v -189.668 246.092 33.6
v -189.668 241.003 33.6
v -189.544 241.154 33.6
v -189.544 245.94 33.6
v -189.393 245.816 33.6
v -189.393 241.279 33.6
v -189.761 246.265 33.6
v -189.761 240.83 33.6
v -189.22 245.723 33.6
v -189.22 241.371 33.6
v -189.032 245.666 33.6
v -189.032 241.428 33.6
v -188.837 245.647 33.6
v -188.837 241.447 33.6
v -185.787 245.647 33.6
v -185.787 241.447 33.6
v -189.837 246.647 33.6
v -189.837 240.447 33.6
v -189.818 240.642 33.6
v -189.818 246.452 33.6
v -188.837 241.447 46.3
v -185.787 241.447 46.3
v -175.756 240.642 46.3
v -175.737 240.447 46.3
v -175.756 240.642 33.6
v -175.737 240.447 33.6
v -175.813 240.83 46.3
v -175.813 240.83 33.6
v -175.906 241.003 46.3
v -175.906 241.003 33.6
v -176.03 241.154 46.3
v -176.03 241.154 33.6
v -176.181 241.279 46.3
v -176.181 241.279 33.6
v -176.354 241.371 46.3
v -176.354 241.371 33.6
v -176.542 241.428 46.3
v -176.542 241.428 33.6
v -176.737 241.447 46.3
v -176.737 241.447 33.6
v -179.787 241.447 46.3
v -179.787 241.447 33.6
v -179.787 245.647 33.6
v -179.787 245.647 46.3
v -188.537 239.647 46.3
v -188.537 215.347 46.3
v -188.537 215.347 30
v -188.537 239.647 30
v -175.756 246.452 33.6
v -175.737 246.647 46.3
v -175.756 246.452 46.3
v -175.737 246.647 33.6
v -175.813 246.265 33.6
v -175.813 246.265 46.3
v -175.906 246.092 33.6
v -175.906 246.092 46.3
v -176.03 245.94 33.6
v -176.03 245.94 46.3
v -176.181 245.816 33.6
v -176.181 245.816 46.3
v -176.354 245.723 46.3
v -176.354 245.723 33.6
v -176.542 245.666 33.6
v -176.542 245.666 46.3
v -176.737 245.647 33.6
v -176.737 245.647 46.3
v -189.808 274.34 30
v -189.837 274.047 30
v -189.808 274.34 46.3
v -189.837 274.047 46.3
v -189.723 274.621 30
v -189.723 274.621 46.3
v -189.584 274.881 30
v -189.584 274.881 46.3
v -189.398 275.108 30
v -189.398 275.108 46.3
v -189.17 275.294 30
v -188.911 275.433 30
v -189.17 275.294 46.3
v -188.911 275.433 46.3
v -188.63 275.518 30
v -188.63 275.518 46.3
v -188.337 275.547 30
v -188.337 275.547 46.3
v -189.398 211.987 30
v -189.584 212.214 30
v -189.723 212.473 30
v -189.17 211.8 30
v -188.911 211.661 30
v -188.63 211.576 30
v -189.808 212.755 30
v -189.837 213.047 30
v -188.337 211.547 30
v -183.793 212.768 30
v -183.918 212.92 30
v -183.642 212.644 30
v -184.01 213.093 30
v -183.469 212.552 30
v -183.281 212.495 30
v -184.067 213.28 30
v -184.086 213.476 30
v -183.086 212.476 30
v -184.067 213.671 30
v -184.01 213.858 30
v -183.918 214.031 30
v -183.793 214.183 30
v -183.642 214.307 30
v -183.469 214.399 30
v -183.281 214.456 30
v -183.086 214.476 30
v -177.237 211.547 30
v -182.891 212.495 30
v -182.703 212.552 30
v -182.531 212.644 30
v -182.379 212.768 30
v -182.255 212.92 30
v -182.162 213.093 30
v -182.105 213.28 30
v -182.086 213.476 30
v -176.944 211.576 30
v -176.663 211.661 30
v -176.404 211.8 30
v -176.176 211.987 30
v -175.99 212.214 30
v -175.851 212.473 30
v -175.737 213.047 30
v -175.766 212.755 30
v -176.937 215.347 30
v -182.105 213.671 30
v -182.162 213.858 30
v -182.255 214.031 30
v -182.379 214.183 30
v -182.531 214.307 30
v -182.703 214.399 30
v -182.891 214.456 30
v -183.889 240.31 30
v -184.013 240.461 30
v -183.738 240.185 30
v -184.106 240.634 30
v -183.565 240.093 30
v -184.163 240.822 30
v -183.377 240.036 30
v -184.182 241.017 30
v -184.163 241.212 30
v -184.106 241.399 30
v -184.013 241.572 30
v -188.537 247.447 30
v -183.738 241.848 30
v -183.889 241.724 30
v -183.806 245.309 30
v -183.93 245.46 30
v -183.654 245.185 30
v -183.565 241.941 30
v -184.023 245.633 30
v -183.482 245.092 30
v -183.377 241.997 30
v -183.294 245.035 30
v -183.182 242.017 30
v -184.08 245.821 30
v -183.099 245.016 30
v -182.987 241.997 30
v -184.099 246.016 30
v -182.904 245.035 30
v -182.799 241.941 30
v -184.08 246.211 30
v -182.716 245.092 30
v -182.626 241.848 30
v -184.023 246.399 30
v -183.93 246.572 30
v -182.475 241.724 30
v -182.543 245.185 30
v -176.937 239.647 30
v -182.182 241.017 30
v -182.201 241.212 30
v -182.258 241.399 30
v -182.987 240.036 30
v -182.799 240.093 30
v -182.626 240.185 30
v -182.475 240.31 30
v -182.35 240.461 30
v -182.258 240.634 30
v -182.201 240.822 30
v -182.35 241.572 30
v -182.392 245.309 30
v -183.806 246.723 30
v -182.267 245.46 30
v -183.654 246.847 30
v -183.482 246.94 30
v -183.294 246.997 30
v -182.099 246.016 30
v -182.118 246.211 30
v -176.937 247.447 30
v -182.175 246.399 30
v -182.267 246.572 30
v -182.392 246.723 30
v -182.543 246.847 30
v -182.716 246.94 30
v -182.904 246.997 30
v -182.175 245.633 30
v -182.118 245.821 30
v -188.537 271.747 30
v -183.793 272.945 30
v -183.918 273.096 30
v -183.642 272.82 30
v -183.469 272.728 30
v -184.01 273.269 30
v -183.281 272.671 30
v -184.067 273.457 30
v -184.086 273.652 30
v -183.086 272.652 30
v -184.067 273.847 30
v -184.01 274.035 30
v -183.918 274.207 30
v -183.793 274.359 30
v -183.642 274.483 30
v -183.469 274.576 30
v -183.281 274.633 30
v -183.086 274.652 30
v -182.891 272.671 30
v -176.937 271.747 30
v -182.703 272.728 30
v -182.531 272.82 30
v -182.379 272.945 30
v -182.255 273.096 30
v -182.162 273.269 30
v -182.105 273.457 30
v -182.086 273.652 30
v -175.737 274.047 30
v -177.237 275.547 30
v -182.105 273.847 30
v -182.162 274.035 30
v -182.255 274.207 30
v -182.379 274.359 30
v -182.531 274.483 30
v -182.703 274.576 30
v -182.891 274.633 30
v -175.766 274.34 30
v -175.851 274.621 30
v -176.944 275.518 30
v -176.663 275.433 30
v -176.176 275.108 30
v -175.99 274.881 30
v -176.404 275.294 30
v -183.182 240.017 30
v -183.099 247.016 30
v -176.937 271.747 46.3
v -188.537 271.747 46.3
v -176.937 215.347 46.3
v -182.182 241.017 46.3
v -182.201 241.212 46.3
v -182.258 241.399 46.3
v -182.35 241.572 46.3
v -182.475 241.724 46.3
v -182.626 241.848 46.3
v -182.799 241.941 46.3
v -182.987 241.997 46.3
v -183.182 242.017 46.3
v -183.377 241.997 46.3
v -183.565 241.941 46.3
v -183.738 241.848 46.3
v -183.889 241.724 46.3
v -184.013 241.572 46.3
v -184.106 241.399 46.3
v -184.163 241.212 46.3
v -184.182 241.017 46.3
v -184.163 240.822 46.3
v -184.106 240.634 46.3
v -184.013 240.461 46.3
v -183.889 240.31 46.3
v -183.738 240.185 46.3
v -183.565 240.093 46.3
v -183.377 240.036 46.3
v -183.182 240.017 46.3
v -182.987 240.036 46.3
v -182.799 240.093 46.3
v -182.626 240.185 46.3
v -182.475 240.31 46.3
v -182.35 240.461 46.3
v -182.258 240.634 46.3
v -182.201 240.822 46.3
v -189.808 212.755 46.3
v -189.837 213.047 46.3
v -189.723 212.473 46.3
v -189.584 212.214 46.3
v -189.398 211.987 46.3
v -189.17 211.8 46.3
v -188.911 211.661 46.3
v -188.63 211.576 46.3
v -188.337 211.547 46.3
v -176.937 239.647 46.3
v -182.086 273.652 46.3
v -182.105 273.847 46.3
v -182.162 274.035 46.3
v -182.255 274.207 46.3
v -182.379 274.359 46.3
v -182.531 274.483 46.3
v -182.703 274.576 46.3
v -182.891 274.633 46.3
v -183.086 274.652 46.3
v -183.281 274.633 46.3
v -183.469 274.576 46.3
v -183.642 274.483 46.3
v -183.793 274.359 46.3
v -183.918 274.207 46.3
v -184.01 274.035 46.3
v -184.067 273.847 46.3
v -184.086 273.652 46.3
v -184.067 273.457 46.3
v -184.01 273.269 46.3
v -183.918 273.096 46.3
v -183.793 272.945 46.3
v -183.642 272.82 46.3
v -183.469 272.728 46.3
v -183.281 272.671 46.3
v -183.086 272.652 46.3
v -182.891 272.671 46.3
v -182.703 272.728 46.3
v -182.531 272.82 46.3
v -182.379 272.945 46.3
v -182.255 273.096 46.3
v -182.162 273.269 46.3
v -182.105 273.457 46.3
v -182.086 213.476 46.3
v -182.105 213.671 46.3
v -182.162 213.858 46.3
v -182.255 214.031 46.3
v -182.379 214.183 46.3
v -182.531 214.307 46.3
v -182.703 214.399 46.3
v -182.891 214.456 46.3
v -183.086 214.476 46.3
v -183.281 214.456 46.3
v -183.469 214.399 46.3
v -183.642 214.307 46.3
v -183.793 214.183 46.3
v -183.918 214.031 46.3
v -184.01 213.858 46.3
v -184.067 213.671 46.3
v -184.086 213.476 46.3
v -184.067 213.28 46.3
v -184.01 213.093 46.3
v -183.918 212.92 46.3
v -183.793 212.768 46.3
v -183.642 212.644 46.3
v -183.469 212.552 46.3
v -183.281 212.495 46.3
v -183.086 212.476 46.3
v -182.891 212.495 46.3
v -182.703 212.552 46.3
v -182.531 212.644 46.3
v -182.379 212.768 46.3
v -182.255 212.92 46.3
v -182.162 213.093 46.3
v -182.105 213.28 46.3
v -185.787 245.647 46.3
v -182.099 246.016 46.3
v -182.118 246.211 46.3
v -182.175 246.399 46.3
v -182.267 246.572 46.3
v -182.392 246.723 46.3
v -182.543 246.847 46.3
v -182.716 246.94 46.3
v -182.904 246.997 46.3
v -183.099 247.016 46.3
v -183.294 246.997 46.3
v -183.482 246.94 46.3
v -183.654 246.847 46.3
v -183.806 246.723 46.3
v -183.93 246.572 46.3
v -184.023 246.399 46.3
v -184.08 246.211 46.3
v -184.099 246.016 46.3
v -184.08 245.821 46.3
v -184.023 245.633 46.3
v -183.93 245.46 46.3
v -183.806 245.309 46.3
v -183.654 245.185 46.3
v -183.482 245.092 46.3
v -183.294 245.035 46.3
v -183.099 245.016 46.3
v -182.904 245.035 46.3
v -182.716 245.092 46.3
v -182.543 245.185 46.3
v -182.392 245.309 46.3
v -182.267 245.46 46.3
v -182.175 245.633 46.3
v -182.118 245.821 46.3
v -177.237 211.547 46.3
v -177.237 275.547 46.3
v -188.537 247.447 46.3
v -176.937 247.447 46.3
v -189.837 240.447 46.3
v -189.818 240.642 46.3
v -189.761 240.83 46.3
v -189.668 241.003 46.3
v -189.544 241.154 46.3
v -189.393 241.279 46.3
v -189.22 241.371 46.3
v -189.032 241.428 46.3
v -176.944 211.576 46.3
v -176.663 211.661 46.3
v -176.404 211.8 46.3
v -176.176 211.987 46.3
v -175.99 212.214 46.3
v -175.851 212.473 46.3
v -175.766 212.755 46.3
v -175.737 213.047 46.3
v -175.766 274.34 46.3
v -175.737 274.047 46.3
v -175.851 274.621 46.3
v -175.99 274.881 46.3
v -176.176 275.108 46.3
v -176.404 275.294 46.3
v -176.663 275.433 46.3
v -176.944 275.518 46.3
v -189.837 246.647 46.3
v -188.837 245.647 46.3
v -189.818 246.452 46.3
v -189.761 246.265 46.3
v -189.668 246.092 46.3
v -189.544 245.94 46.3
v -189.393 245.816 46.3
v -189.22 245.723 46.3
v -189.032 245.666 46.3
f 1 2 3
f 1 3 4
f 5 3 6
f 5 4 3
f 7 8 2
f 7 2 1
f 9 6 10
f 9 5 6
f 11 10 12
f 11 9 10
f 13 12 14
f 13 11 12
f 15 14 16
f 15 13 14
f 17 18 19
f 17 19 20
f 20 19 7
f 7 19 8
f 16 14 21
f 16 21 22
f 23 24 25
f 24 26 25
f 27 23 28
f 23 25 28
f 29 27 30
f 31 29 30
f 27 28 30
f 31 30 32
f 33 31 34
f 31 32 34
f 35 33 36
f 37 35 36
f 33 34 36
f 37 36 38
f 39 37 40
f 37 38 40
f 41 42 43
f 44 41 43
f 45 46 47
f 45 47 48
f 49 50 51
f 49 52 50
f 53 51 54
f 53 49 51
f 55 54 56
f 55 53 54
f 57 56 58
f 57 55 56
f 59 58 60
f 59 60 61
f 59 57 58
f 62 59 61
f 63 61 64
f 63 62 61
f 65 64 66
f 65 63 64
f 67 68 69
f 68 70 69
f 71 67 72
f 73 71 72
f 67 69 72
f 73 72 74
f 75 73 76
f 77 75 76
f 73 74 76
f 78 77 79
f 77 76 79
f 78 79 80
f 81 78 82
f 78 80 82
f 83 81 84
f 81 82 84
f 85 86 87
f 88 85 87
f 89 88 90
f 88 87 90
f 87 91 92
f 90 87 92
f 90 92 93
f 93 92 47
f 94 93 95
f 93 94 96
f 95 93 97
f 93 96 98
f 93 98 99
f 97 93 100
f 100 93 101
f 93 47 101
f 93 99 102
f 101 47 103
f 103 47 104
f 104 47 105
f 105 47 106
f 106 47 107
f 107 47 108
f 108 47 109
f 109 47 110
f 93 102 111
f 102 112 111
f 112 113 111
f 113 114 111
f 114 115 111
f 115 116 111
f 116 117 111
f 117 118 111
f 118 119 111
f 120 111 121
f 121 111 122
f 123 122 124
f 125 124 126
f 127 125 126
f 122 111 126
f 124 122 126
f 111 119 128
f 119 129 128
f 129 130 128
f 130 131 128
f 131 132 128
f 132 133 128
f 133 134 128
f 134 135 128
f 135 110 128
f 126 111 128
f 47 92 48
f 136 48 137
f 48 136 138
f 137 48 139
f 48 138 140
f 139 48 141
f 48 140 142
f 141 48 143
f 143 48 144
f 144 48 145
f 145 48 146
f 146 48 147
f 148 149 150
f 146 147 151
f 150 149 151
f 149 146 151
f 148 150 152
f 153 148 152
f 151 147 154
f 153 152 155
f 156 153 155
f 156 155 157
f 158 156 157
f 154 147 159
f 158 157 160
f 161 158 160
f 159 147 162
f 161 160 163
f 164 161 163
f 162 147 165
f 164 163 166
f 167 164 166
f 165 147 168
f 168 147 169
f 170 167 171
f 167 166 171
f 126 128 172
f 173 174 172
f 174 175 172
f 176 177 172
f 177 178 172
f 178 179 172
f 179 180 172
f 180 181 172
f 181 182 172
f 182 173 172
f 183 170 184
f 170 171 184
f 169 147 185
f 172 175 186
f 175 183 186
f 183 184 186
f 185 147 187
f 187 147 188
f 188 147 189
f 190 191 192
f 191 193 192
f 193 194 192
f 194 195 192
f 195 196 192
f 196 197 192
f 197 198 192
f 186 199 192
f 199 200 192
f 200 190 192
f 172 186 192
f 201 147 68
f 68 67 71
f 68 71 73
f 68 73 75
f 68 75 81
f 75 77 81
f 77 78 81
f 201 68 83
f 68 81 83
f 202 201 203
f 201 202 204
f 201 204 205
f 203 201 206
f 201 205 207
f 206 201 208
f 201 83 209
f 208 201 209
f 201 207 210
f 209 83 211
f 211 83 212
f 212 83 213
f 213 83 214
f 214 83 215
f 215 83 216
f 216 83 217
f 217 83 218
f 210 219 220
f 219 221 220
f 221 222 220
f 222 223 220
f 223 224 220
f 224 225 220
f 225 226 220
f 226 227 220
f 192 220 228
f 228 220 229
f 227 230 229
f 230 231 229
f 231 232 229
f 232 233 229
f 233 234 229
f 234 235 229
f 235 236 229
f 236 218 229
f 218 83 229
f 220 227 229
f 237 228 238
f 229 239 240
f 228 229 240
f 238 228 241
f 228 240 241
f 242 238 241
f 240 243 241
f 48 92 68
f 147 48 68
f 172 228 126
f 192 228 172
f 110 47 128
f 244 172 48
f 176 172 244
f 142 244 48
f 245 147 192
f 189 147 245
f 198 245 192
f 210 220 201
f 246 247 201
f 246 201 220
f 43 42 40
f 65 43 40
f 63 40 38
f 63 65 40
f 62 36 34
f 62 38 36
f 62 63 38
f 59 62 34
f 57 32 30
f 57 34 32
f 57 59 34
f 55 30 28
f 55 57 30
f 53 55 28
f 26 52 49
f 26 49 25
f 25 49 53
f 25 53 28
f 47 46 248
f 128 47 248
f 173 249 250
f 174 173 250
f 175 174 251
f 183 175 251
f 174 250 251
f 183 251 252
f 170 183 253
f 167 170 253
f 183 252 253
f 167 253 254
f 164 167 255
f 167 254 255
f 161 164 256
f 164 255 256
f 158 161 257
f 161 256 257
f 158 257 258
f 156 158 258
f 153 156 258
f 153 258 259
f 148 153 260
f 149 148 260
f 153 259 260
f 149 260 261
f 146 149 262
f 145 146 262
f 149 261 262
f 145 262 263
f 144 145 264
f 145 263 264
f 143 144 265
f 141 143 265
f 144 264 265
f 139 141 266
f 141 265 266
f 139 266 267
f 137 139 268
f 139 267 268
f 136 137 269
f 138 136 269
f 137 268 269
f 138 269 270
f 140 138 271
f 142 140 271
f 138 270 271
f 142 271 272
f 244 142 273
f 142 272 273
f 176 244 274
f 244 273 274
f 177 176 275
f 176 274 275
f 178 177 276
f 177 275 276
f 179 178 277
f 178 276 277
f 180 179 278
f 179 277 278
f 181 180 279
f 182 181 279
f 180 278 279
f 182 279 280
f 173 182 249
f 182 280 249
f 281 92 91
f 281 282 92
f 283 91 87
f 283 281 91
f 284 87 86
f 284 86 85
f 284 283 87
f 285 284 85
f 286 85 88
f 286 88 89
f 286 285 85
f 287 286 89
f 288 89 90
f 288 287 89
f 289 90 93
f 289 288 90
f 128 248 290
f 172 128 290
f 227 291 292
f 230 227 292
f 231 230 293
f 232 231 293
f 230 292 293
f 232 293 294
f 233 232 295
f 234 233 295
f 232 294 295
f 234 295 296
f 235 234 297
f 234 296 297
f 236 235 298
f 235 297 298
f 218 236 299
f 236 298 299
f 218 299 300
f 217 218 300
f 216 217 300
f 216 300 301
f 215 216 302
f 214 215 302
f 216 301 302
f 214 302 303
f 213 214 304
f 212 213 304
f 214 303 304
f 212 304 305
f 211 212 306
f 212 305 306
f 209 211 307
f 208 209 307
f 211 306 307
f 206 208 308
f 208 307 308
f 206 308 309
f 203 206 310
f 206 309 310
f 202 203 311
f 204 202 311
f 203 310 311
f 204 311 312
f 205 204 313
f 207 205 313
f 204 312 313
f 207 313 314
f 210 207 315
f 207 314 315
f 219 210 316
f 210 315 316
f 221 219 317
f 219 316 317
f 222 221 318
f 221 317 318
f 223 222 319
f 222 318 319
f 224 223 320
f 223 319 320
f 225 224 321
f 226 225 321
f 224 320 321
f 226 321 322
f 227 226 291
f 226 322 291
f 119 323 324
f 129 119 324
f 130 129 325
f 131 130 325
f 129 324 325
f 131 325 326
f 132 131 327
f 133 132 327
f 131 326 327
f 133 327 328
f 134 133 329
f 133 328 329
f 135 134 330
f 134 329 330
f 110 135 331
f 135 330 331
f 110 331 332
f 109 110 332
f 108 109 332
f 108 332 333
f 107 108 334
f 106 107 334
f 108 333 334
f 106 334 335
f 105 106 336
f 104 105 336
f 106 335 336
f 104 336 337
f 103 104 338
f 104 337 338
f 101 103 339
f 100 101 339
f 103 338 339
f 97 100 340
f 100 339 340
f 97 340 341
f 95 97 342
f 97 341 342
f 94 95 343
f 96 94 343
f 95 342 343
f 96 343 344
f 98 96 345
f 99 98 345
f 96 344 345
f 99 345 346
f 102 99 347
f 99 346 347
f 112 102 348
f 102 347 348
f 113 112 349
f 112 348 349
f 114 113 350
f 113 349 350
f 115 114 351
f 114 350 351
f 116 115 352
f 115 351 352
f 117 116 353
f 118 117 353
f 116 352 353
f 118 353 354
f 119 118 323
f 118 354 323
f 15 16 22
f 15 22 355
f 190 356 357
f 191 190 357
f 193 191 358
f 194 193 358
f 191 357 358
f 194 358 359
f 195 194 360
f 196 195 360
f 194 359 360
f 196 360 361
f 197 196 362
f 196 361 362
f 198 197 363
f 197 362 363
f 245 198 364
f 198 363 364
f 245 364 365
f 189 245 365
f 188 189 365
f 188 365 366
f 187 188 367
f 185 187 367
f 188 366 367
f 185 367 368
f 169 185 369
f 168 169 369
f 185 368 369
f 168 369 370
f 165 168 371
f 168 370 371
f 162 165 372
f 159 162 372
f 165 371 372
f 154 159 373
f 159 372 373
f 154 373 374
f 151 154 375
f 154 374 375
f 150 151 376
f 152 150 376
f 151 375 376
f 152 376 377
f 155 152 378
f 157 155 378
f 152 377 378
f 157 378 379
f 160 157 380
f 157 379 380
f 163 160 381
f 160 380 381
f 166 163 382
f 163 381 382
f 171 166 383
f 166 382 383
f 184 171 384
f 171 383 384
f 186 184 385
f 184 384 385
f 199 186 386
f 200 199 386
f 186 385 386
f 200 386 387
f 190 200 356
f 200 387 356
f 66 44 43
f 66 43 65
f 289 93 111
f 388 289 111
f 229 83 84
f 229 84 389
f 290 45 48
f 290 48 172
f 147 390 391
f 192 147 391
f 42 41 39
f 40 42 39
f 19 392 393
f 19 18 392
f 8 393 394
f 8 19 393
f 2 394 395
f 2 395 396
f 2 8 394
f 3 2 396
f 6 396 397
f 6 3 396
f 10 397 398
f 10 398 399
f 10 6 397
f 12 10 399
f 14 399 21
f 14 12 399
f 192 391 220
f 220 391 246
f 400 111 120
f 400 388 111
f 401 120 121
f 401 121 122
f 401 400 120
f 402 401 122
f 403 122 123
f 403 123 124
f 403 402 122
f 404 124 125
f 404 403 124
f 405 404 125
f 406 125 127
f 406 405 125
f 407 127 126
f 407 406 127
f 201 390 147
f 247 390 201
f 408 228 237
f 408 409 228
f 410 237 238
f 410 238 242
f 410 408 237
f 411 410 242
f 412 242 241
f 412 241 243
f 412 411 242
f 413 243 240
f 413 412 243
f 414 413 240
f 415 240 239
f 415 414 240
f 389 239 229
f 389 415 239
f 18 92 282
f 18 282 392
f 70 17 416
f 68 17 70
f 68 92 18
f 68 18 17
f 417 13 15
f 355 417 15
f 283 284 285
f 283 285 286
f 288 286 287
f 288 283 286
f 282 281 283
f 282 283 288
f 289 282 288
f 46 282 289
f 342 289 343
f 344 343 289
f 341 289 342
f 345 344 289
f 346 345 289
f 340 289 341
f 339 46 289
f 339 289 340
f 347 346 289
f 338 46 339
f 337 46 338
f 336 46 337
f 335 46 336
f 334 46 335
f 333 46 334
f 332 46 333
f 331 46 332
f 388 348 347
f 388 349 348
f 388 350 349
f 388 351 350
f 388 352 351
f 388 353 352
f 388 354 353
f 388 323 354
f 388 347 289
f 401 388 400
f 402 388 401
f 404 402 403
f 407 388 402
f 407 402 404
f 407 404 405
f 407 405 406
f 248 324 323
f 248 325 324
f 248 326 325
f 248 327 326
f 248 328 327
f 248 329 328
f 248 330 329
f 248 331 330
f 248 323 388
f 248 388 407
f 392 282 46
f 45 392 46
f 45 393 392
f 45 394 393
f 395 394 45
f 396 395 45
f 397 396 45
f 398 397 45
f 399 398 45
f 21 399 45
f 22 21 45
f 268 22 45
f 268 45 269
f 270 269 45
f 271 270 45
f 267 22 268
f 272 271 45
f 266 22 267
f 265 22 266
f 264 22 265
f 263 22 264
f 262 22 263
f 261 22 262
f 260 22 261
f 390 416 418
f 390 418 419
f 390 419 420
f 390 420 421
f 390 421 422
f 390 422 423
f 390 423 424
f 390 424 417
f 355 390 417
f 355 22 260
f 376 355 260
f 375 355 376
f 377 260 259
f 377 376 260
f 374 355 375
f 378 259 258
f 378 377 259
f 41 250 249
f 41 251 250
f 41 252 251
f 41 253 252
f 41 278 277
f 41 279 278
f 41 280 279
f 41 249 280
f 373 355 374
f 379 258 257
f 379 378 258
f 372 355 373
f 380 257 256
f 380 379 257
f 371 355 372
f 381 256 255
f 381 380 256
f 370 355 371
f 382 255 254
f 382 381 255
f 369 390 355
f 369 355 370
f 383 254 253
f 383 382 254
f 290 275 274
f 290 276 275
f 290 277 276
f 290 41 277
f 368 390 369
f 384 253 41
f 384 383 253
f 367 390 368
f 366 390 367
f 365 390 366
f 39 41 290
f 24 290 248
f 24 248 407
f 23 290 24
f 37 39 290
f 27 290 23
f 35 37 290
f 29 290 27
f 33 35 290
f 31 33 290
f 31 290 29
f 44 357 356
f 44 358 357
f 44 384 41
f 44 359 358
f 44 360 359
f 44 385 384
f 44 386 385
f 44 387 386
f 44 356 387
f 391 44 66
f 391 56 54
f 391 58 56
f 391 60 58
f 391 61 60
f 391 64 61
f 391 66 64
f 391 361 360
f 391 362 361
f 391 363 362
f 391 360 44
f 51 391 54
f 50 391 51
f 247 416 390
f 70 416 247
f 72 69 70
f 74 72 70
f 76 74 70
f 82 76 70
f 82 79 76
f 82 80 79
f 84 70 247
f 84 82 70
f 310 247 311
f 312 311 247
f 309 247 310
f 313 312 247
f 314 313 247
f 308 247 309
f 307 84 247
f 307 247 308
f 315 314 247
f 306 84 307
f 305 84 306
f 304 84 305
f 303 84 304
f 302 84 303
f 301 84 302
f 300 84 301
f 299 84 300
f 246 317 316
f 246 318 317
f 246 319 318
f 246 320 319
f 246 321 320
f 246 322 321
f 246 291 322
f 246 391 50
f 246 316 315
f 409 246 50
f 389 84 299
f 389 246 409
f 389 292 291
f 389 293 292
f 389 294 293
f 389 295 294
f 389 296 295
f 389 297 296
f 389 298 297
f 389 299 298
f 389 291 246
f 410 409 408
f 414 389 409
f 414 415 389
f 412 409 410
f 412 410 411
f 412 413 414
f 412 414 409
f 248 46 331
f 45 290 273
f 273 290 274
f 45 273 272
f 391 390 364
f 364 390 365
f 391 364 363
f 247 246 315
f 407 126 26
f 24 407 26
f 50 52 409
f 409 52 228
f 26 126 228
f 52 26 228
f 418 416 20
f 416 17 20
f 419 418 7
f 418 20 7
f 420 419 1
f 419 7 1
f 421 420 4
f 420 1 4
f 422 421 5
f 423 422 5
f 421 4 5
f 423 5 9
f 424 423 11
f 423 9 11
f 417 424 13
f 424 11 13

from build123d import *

# Parameters (mm, degrees)
SKETCH4_W           = 14.1
SKETCH4_H           = 64
BOSS_EXTRUDE1_DEPTH = 16.3
FILLET1_R           = 1.5
SKETCH5_W           = 11.6
SKETCH5_H           = 24.3
CUT_EXTRUDE1_DEPTH  = 16.3
SKETCH6_W           = 4.05
SKETCH6_H           = 4.2
CUT_EXTRUDE2_DEPTH  = 12.7
FILLET2_R           = 1
SKETCH7_R           = 1
CUT_EXTRUDE3_DEPTH  = 16.3


with BuildPart() as part:
    # Sketch4 → Boss-Extrude1 (new body)
    with BuildSketch(Plane.XY.offset(30)):
        with Locations((-182.786990356, 243.547210693)):
            Rectangle(SKETCH4_W, SKETCH4_H)
    extrude(amount=BOSS_EXTRUDE1_DEPTH)

    # Fillet1
    fillet1_edges = [part.edges().sort_by_distance(p)[0] for p in [
        (-189.836990356, 275.547210693, 38.15),
        (-175.736990356, 275.547210693, 38.15),
        (-175.736990356, 211.547210693, 38.15),
        (-189.836990356, 211.547210693, 38.15),
    ]]
    fillet(fillet1_edges, radius=FILLET1_R)

    # Sketch5 → Cut-Extrude1 (cut)
    with BuildSketch(Plane.XY.offset(46.3)):
        with Locations((-182.736990356, 259.597210693)):
            Rectangle(SKETCH5_W, SKETCH5_H)
        with Locations((-182.736990356, 227.497210693)):
            Rectangle(SKETCH5_W, SKETCH5_H)
    extrude(amount=-CUT_EXTRUDE1_DEPTH, mode=Mode.SUBTRACT)

    # Sketch6 → Cut-Extrude2 (cut)
    with BuildSketch(Plane.XY.offset(46.3)):
        with Locations((-187.811990356, 243.547210693)):
            Rectangle(SKETCH6_W, SKETCH6_H)
        with Locations((-177.761990356, 243.547210693)):
            Rectangle(SKETCH6_W, SKETCH6_H)
    extrude(amount=-CUT_EXTRUDE2_DEPTH, mode=Mode.SUBTRACT)

    # Fillet2
    fillet2_edges = [part.edges().sort_by_distance(p)[0] for p in [
        (-189.836990356, 241.447210693, 39.95),
        (-189.836990356, 245.647210693, 39.95),
        (-175.736990356, 245.647210693, 39.95),
        (-175.736990356, 241.447210693, 39.95),
    ]]
    fillet(fillet2_edges, radius=FILLET2_R)

    # Sketch7 → Cut-Extrude3 (cut)
    with BuildSketch(Plane.XY.offset(46.3)):
        with Locations((-183.086103711, 273.651926582)):
            Circle(SKETCH7_R)
        with Locations((-183.086103711, 213.475534384)):
            Circle(SKETCH7_R)
        with Locations((-183.098908316, 246.016003292)):
            Circle(SKETCH7_R)
        with Locations((-183.18196106, 241.016693115)):
            Circle(SKETCH7_R)
    extrude(amount=-CUT_EXTRUDE3_DEPTH, mode=Mode.SUBTRACT)


solid = part.part
